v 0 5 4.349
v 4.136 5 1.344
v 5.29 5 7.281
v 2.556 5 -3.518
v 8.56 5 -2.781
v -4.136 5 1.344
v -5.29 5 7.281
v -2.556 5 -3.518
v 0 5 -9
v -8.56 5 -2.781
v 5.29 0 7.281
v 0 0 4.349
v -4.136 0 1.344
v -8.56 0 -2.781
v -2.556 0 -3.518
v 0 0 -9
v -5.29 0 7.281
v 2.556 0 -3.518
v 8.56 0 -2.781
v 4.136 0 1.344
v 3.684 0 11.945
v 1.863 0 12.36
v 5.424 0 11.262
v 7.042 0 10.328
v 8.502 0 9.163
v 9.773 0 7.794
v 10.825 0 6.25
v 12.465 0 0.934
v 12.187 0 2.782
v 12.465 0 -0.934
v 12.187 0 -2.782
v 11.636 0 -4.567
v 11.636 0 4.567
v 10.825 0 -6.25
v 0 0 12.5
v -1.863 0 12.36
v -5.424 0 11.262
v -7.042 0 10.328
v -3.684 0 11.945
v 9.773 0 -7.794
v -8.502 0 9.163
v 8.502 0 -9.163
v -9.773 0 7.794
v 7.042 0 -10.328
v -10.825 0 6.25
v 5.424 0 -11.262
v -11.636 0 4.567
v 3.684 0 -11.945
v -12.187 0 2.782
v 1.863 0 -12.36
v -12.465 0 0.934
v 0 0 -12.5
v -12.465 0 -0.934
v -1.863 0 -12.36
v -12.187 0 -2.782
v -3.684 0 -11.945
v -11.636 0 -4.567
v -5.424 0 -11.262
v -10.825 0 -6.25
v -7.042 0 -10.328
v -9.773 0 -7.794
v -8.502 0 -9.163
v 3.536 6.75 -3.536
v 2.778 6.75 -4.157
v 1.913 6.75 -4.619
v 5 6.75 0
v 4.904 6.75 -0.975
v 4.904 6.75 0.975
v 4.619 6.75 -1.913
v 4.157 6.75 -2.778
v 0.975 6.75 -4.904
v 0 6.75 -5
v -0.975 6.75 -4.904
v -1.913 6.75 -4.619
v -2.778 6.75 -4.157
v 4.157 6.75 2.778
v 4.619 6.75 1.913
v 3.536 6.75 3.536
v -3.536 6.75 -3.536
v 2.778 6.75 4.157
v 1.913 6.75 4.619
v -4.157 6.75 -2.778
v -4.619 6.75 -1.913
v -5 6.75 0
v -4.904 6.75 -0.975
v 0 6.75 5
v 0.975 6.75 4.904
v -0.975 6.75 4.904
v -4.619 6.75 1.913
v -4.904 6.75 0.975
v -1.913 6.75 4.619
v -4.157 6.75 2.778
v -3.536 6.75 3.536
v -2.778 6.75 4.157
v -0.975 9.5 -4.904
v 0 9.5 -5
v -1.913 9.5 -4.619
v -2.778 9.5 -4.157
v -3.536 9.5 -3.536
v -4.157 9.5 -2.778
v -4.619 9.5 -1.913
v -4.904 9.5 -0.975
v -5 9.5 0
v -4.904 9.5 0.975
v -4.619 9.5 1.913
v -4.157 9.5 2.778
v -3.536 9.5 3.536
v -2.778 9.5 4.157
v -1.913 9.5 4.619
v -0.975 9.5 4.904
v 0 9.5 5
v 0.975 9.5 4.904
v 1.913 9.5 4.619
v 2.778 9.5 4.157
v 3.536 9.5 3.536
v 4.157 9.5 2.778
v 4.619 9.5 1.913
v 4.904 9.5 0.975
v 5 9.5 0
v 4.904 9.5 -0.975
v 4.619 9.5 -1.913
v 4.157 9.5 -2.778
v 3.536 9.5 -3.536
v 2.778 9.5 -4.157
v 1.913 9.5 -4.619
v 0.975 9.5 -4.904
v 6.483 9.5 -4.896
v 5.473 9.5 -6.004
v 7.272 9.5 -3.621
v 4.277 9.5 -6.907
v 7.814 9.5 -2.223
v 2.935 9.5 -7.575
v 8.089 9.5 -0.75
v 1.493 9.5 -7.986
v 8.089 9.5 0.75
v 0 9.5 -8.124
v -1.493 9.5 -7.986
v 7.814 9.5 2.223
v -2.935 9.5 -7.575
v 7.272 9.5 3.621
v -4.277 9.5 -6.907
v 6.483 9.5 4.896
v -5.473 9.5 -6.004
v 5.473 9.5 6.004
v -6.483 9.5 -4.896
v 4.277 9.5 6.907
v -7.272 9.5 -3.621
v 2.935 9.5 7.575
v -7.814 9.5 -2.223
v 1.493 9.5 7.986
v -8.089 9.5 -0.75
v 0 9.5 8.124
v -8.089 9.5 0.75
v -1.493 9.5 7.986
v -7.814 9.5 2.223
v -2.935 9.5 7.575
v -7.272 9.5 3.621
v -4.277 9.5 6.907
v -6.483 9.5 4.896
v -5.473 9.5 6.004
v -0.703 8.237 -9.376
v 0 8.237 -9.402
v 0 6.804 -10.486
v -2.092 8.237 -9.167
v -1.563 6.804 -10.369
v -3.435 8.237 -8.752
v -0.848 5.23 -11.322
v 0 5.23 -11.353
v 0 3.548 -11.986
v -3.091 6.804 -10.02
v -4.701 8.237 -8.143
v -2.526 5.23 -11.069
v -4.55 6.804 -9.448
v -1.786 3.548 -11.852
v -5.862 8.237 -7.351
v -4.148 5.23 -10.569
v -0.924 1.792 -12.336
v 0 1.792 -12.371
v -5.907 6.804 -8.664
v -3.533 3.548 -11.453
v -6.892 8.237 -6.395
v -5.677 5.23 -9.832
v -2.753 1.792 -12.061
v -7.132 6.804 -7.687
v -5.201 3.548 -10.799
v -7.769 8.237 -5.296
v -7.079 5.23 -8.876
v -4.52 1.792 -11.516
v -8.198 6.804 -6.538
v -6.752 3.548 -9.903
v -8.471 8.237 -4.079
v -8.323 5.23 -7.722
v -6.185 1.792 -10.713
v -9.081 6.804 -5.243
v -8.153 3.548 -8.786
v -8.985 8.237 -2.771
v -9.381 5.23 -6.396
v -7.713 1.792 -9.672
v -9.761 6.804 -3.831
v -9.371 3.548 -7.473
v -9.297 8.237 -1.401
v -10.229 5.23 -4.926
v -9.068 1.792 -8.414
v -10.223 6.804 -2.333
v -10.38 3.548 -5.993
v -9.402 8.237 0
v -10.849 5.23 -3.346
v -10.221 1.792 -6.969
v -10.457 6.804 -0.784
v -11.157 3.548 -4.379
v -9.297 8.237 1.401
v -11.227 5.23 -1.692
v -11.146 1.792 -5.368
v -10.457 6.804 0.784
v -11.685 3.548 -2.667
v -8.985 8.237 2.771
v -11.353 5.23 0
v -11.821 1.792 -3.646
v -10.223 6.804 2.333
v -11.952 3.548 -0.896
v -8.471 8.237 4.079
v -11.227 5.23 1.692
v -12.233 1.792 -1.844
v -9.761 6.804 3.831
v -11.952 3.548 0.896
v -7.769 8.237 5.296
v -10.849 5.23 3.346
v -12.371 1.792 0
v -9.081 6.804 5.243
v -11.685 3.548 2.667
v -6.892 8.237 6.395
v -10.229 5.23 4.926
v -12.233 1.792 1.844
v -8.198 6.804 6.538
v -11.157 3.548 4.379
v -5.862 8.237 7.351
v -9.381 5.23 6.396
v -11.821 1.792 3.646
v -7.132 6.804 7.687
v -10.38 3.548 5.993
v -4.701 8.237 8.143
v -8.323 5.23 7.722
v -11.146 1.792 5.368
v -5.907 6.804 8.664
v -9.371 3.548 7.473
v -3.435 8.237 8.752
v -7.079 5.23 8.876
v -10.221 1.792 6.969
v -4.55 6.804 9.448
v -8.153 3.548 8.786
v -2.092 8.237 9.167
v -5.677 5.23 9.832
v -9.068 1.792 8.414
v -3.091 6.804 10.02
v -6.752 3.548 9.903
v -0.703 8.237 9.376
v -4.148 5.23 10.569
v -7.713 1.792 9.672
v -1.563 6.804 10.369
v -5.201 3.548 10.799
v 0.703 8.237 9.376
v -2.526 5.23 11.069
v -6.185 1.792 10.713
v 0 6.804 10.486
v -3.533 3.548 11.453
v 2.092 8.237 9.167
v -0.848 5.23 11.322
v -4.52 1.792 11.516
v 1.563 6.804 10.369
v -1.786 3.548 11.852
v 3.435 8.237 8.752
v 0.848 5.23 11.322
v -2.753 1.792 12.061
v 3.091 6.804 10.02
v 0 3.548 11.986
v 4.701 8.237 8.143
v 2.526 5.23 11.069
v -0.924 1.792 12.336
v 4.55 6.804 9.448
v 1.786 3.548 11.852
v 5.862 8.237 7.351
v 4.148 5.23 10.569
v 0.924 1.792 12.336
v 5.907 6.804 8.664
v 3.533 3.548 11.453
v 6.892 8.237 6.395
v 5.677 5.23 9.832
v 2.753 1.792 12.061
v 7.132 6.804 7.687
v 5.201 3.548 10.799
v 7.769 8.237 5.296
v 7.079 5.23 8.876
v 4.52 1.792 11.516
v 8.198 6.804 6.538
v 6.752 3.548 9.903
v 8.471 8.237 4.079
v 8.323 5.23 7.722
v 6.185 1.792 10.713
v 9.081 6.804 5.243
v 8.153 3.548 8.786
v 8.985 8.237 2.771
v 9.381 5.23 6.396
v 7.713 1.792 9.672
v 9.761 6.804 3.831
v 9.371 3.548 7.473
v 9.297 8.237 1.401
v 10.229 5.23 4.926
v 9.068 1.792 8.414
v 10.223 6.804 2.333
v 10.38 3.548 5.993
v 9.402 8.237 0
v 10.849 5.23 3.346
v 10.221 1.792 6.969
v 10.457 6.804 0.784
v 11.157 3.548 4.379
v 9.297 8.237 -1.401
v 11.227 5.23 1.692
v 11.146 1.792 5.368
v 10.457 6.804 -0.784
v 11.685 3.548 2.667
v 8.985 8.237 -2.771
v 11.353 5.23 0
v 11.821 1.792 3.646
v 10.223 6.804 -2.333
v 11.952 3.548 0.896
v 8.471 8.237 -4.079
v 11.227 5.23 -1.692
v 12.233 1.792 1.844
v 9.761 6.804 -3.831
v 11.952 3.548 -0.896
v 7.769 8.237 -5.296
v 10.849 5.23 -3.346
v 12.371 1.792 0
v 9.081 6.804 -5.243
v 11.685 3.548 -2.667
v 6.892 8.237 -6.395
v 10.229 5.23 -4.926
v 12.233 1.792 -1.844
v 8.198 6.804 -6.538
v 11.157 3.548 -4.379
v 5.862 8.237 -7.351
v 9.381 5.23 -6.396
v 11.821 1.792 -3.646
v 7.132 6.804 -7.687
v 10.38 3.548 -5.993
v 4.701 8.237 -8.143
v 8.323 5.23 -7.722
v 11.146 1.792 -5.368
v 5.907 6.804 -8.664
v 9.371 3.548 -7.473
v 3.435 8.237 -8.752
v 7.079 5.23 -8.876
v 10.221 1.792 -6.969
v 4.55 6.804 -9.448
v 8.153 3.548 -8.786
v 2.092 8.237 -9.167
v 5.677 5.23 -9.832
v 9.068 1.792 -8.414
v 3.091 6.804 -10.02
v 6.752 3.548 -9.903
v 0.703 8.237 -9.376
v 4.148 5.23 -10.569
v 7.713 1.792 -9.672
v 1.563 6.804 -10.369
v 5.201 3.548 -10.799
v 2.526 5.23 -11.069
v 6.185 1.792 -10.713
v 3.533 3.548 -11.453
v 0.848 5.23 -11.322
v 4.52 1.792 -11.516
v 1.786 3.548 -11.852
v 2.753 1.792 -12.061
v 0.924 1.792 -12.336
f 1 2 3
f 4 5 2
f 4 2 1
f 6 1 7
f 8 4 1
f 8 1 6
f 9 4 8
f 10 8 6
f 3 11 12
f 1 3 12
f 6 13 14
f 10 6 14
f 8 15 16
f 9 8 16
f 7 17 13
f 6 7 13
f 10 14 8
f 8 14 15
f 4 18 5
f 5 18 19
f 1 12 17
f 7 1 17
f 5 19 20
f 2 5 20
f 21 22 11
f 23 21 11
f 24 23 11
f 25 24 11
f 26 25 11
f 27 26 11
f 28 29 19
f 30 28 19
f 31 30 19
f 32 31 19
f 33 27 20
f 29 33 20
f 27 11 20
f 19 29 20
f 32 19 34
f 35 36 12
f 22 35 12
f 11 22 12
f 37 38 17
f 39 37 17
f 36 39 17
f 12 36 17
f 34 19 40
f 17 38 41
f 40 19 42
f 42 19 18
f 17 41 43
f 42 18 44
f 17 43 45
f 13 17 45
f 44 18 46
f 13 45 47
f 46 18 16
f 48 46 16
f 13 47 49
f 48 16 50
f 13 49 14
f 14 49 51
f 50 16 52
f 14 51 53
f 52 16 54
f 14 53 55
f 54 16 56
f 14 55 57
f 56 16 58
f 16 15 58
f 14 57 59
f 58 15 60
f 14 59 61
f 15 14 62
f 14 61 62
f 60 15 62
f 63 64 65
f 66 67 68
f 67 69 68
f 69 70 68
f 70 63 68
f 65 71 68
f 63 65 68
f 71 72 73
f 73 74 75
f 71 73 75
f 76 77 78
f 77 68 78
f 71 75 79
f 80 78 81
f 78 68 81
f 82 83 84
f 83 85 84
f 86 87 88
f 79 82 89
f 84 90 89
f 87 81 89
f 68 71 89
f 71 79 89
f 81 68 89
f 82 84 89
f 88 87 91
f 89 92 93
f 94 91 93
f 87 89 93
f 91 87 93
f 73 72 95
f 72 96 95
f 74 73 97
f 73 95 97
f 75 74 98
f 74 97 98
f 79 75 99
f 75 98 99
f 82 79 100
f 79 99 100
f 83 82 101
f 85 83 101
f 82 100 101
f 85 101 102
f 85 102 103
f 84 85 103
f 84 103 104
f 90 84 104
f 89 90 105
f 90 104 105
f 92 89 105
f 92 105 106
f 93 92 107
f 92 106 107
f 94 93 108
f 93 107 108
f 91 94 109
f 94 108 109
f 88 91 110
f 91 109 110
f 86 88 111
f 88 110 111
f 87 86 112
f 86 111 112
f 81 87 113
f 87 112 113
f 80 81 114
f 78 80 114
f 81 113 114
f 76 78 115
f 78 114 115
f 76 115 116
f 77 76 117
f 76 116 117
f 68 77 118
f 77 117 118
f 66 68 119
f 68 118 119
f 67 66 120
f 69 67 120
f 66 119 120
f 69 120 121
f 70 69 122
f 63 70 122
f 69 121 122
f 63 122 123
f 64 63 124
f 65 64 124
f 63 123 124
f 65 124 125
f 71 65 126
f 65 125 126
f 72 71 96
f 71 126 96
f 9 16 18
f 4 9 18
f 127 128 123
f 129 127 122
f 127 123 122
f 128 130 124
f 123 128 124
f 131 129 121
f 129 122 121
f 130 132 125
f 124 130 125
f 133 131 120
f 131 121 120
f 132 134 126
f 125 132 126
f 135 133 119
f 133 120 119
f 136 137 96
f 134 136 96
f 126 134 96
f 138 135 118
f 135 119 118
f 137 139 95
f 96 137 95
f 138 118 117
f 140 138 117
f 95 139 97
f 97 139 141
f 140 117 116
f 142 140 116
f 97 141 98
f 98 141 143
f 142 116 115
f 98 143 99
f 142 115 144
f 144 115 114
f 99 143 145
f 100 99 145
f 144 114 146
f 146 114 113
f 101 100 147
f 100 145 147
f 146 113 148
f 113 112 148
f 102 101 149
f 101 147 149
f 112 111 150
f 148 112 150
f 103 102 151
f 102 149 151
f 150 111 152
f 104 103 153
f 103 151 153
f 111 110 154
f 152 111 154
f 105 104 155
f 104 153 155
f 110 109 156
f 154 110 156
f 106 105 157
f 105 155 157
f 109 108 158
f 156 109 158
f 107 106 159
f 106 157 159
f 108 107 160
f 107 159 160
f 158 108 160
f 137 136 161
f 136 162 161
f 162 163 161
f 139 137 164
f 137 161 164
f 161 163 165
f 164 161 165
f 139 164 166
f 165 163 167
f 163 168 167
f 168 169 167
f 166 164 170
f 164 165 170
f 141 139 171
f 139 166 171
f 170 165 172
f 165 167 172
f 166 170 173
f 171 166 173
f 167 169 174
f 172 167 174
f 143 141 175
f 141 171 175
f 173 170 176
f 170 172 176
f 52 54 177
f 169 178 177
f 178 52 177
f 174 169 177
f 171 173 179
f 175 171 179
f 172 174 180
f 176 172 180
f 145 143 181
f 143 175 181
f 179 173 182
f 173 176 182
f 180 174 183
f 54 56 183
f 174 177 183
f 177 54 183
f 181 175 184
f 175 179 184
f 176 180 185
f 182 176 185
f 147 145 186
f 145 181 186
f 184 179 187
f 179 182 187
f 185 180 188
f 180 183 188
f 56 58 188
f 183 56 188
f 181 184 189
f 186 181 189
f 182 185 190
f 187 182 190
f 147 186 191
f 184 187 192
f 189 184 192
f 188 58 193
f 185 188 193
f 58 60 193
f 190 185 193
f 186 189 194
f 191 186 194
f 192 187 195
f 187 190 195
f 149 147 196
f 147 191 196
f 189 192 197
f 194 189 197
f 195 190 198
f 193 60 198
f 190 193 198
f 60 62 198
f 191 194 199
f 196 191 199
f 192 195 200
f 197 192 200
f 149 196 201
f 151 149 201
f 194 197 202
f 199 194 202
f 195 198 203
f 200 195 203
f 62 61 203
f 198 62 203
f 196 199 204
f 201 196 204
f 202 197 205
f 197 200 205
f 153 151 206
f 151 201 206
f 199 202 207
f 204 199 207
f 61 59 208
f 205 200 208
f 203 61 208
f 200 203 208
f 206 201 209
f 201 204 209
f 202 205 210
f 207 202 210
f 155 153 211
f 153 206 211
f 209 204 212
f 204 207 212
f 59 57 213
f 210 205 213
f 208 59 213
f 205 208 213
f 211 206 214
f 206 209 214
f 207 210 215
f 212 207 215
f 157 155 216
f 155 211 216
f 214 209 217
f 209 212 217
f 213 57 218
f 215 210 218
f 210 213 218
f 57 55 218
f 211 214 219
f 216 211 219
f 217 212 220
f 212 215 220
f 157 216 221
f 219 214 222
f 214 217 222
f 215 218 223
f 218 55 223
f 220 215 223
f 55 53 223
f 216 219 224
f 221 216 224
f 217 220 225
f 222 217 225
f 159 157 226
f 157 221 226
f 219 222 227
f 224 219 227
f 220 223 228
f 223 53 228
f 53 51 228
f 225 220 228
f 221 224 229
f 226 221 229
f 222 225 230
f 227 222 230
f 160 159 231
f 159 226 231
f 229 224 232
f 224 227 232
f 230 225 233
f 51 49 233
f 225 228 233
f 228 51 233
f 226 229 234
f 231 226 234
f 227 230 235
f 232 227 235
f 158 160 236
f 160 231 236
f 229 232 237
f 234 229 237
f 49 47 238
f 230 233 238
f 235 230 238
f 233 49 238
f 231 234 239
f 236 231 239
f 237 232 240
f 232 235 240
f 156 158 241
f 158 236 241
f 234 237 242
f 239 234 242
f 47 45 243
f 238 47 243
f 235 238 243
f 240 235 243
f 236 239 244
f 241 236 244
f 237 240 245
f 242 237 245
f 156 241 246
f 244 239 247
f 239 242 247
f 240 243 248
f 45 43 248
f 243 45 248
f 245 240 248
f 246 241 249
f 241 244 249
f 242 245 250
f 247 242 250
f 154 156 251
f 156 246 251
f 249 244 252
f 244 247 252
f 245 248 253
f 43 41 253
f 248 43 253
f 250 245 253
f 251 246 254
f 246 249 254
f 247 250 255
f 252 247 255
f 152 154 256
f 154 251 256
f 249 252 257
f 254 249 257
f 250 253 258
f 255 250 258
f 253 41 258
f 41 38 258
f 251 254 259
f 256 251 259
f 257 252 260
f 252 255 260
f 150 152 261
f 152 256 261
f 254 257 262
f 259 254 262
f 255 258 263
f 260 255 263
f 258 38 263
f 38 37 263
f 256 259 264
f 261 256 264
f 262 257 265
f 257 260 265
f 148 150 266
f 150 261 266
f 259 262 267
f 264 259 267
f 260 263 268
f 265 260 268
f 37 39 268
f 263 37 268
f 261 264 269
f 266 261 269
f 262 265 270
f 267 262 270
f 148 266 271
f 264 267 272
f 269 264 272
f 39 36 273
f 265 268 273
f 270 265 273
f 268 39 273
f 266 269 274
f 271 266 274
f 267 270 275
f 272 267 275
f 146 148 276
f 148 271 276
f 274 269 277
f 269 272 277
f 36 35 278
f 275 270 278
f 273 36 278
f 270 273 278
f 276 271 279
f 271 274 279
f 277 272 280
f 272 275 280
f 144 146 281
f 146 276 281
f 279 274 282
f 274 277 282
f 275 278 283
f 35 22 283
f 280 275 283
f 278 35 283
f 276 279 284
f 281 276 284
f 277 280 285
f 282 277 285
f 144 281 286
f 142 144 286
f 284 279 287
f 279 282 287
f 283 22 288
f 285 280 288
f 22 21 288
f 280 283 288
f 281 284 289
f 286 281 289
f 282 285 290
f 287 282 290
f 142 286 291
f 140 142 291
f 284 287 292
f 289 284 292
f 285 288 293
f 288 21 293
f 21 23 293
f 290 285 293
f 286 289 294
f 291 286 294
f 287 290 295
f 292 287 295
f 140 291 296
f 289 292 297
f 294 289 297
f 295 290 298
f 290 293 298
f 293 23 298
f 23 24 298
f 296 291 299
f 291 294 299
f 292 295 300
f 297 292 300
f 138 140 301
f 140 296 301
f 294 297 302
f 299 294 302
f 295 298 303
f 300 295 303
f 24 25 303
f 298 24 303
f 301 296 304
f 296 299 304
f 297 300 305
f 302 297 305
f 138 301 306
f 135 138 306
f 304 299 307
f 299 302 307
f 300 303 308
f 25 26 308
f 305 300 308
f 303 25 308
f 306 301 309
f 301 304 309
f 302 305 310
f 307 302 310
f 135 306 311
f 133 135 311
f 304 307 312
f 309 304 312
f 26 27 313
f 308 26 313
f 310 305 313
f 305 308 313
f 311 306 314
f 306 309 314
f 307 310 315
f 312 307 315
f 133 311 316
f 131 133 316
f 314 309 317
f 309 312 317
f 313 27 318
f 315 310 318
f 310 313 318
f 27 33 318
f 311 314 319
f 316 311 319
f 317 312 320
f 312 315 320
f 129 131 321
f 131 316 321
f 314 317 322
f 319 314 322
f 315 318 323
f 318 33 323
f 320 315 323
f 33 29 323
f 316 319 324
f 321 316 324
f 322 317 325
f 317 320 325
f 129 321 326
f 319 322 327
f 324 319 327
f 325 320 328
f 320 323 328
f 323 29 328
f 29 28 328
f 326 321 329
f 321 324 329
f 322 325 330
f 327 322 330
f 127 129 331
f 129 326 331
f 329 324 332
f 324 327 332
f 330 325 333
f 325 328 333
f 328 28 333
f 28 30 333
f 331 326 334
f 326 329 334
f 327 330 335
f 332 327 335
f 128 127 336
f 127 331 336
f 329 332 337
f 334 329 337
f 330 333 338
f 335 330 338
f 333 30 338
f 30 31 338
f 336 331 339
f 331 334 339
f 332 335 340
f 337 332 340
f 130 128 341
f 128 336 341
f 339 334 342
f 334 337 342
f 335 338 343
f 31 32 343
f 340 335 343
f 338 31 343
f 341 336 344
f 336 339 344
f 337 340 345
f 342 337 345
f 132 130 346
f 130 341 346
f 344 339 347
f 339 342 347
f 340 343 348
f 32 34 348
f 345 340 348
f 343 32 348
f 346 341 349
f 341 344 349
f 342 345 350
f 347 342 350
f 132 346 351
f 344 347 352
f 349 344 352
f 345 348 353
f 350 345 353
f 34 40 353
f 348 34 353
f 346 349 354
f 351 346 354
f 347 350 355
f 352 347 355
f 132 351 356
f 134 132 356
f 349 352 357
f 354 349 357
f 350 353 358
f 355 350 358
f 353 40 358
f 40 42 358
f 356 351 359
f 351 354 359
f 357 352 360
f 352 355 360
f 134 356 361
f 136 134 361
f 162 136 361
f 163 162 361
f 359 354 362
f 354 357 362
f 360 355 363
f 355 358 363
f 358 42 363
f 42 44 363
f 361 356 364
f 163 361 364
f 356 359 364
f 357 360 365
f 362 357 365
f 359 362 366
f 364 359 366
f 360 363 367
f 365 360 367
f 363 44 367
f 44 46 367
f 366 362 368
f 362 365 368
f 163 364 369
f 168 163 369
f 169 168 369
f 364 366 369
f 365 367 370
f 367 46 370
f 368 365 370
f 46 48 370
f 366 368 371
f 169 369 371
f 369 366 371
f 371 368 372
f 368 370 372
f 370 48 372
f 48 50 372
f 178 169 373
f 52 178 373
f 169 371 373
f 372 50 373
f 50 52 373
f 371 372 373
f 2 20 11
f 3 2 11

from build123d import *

# Parameters (mm, degrees)
CUT_EXTRUDE1_DEPTH = 5


with BuildPart() as part:
    # Sketch1 → Revolve1 (revolve)
    with BuildSketch(Plane.XY, mode=Mode.PRIVATE) as revolve1_sk:
        with BuildLine():
            Line((12.5, 0), (0, 0))
            Line((0, 0), (0, 6.75))
            Line((0, 6.75), (5, 6.75))
            Line((5, 6.75), (5, 9.5))
            Line((5, 9.5), (8.124038405, 9.5))
            ThreePointArc((8.124038405, 9.5), (11.353424154, 5.229699797), (12.5, 0))
        make_face()
    revolve(revolve1_sk.sketch.rotate(Axis((0, 0, 0), (0, 1, 0)), 90), axis=Axis((0, 0, 0), (0, 1, 0)))

    # Sketch2 → Cut-Extrude1 (cut)
    with BuildSketch(Plane(origin=(0, 0, 0), x_dir=(1, 0, 0), z_dir=(0, 1, 0))):
        Polygon((0, 9), (2.556172718, 3.518269915), (8.559508647, 2.781152949), (4.13597434, -1.343859526), (5.290067271, -7.281152949), (0, -4.348820778), (-5.290067271, -7.281152949), (-4.13597434, -1.343859526), (-8.559508647, 2.781152949), (-2.556172718, 3.518269915), align=None)
    extrude(amount=CUT_EXTRUDE1_DEPTH, mode=Mode.SUBTRACT)


solid = part.part
